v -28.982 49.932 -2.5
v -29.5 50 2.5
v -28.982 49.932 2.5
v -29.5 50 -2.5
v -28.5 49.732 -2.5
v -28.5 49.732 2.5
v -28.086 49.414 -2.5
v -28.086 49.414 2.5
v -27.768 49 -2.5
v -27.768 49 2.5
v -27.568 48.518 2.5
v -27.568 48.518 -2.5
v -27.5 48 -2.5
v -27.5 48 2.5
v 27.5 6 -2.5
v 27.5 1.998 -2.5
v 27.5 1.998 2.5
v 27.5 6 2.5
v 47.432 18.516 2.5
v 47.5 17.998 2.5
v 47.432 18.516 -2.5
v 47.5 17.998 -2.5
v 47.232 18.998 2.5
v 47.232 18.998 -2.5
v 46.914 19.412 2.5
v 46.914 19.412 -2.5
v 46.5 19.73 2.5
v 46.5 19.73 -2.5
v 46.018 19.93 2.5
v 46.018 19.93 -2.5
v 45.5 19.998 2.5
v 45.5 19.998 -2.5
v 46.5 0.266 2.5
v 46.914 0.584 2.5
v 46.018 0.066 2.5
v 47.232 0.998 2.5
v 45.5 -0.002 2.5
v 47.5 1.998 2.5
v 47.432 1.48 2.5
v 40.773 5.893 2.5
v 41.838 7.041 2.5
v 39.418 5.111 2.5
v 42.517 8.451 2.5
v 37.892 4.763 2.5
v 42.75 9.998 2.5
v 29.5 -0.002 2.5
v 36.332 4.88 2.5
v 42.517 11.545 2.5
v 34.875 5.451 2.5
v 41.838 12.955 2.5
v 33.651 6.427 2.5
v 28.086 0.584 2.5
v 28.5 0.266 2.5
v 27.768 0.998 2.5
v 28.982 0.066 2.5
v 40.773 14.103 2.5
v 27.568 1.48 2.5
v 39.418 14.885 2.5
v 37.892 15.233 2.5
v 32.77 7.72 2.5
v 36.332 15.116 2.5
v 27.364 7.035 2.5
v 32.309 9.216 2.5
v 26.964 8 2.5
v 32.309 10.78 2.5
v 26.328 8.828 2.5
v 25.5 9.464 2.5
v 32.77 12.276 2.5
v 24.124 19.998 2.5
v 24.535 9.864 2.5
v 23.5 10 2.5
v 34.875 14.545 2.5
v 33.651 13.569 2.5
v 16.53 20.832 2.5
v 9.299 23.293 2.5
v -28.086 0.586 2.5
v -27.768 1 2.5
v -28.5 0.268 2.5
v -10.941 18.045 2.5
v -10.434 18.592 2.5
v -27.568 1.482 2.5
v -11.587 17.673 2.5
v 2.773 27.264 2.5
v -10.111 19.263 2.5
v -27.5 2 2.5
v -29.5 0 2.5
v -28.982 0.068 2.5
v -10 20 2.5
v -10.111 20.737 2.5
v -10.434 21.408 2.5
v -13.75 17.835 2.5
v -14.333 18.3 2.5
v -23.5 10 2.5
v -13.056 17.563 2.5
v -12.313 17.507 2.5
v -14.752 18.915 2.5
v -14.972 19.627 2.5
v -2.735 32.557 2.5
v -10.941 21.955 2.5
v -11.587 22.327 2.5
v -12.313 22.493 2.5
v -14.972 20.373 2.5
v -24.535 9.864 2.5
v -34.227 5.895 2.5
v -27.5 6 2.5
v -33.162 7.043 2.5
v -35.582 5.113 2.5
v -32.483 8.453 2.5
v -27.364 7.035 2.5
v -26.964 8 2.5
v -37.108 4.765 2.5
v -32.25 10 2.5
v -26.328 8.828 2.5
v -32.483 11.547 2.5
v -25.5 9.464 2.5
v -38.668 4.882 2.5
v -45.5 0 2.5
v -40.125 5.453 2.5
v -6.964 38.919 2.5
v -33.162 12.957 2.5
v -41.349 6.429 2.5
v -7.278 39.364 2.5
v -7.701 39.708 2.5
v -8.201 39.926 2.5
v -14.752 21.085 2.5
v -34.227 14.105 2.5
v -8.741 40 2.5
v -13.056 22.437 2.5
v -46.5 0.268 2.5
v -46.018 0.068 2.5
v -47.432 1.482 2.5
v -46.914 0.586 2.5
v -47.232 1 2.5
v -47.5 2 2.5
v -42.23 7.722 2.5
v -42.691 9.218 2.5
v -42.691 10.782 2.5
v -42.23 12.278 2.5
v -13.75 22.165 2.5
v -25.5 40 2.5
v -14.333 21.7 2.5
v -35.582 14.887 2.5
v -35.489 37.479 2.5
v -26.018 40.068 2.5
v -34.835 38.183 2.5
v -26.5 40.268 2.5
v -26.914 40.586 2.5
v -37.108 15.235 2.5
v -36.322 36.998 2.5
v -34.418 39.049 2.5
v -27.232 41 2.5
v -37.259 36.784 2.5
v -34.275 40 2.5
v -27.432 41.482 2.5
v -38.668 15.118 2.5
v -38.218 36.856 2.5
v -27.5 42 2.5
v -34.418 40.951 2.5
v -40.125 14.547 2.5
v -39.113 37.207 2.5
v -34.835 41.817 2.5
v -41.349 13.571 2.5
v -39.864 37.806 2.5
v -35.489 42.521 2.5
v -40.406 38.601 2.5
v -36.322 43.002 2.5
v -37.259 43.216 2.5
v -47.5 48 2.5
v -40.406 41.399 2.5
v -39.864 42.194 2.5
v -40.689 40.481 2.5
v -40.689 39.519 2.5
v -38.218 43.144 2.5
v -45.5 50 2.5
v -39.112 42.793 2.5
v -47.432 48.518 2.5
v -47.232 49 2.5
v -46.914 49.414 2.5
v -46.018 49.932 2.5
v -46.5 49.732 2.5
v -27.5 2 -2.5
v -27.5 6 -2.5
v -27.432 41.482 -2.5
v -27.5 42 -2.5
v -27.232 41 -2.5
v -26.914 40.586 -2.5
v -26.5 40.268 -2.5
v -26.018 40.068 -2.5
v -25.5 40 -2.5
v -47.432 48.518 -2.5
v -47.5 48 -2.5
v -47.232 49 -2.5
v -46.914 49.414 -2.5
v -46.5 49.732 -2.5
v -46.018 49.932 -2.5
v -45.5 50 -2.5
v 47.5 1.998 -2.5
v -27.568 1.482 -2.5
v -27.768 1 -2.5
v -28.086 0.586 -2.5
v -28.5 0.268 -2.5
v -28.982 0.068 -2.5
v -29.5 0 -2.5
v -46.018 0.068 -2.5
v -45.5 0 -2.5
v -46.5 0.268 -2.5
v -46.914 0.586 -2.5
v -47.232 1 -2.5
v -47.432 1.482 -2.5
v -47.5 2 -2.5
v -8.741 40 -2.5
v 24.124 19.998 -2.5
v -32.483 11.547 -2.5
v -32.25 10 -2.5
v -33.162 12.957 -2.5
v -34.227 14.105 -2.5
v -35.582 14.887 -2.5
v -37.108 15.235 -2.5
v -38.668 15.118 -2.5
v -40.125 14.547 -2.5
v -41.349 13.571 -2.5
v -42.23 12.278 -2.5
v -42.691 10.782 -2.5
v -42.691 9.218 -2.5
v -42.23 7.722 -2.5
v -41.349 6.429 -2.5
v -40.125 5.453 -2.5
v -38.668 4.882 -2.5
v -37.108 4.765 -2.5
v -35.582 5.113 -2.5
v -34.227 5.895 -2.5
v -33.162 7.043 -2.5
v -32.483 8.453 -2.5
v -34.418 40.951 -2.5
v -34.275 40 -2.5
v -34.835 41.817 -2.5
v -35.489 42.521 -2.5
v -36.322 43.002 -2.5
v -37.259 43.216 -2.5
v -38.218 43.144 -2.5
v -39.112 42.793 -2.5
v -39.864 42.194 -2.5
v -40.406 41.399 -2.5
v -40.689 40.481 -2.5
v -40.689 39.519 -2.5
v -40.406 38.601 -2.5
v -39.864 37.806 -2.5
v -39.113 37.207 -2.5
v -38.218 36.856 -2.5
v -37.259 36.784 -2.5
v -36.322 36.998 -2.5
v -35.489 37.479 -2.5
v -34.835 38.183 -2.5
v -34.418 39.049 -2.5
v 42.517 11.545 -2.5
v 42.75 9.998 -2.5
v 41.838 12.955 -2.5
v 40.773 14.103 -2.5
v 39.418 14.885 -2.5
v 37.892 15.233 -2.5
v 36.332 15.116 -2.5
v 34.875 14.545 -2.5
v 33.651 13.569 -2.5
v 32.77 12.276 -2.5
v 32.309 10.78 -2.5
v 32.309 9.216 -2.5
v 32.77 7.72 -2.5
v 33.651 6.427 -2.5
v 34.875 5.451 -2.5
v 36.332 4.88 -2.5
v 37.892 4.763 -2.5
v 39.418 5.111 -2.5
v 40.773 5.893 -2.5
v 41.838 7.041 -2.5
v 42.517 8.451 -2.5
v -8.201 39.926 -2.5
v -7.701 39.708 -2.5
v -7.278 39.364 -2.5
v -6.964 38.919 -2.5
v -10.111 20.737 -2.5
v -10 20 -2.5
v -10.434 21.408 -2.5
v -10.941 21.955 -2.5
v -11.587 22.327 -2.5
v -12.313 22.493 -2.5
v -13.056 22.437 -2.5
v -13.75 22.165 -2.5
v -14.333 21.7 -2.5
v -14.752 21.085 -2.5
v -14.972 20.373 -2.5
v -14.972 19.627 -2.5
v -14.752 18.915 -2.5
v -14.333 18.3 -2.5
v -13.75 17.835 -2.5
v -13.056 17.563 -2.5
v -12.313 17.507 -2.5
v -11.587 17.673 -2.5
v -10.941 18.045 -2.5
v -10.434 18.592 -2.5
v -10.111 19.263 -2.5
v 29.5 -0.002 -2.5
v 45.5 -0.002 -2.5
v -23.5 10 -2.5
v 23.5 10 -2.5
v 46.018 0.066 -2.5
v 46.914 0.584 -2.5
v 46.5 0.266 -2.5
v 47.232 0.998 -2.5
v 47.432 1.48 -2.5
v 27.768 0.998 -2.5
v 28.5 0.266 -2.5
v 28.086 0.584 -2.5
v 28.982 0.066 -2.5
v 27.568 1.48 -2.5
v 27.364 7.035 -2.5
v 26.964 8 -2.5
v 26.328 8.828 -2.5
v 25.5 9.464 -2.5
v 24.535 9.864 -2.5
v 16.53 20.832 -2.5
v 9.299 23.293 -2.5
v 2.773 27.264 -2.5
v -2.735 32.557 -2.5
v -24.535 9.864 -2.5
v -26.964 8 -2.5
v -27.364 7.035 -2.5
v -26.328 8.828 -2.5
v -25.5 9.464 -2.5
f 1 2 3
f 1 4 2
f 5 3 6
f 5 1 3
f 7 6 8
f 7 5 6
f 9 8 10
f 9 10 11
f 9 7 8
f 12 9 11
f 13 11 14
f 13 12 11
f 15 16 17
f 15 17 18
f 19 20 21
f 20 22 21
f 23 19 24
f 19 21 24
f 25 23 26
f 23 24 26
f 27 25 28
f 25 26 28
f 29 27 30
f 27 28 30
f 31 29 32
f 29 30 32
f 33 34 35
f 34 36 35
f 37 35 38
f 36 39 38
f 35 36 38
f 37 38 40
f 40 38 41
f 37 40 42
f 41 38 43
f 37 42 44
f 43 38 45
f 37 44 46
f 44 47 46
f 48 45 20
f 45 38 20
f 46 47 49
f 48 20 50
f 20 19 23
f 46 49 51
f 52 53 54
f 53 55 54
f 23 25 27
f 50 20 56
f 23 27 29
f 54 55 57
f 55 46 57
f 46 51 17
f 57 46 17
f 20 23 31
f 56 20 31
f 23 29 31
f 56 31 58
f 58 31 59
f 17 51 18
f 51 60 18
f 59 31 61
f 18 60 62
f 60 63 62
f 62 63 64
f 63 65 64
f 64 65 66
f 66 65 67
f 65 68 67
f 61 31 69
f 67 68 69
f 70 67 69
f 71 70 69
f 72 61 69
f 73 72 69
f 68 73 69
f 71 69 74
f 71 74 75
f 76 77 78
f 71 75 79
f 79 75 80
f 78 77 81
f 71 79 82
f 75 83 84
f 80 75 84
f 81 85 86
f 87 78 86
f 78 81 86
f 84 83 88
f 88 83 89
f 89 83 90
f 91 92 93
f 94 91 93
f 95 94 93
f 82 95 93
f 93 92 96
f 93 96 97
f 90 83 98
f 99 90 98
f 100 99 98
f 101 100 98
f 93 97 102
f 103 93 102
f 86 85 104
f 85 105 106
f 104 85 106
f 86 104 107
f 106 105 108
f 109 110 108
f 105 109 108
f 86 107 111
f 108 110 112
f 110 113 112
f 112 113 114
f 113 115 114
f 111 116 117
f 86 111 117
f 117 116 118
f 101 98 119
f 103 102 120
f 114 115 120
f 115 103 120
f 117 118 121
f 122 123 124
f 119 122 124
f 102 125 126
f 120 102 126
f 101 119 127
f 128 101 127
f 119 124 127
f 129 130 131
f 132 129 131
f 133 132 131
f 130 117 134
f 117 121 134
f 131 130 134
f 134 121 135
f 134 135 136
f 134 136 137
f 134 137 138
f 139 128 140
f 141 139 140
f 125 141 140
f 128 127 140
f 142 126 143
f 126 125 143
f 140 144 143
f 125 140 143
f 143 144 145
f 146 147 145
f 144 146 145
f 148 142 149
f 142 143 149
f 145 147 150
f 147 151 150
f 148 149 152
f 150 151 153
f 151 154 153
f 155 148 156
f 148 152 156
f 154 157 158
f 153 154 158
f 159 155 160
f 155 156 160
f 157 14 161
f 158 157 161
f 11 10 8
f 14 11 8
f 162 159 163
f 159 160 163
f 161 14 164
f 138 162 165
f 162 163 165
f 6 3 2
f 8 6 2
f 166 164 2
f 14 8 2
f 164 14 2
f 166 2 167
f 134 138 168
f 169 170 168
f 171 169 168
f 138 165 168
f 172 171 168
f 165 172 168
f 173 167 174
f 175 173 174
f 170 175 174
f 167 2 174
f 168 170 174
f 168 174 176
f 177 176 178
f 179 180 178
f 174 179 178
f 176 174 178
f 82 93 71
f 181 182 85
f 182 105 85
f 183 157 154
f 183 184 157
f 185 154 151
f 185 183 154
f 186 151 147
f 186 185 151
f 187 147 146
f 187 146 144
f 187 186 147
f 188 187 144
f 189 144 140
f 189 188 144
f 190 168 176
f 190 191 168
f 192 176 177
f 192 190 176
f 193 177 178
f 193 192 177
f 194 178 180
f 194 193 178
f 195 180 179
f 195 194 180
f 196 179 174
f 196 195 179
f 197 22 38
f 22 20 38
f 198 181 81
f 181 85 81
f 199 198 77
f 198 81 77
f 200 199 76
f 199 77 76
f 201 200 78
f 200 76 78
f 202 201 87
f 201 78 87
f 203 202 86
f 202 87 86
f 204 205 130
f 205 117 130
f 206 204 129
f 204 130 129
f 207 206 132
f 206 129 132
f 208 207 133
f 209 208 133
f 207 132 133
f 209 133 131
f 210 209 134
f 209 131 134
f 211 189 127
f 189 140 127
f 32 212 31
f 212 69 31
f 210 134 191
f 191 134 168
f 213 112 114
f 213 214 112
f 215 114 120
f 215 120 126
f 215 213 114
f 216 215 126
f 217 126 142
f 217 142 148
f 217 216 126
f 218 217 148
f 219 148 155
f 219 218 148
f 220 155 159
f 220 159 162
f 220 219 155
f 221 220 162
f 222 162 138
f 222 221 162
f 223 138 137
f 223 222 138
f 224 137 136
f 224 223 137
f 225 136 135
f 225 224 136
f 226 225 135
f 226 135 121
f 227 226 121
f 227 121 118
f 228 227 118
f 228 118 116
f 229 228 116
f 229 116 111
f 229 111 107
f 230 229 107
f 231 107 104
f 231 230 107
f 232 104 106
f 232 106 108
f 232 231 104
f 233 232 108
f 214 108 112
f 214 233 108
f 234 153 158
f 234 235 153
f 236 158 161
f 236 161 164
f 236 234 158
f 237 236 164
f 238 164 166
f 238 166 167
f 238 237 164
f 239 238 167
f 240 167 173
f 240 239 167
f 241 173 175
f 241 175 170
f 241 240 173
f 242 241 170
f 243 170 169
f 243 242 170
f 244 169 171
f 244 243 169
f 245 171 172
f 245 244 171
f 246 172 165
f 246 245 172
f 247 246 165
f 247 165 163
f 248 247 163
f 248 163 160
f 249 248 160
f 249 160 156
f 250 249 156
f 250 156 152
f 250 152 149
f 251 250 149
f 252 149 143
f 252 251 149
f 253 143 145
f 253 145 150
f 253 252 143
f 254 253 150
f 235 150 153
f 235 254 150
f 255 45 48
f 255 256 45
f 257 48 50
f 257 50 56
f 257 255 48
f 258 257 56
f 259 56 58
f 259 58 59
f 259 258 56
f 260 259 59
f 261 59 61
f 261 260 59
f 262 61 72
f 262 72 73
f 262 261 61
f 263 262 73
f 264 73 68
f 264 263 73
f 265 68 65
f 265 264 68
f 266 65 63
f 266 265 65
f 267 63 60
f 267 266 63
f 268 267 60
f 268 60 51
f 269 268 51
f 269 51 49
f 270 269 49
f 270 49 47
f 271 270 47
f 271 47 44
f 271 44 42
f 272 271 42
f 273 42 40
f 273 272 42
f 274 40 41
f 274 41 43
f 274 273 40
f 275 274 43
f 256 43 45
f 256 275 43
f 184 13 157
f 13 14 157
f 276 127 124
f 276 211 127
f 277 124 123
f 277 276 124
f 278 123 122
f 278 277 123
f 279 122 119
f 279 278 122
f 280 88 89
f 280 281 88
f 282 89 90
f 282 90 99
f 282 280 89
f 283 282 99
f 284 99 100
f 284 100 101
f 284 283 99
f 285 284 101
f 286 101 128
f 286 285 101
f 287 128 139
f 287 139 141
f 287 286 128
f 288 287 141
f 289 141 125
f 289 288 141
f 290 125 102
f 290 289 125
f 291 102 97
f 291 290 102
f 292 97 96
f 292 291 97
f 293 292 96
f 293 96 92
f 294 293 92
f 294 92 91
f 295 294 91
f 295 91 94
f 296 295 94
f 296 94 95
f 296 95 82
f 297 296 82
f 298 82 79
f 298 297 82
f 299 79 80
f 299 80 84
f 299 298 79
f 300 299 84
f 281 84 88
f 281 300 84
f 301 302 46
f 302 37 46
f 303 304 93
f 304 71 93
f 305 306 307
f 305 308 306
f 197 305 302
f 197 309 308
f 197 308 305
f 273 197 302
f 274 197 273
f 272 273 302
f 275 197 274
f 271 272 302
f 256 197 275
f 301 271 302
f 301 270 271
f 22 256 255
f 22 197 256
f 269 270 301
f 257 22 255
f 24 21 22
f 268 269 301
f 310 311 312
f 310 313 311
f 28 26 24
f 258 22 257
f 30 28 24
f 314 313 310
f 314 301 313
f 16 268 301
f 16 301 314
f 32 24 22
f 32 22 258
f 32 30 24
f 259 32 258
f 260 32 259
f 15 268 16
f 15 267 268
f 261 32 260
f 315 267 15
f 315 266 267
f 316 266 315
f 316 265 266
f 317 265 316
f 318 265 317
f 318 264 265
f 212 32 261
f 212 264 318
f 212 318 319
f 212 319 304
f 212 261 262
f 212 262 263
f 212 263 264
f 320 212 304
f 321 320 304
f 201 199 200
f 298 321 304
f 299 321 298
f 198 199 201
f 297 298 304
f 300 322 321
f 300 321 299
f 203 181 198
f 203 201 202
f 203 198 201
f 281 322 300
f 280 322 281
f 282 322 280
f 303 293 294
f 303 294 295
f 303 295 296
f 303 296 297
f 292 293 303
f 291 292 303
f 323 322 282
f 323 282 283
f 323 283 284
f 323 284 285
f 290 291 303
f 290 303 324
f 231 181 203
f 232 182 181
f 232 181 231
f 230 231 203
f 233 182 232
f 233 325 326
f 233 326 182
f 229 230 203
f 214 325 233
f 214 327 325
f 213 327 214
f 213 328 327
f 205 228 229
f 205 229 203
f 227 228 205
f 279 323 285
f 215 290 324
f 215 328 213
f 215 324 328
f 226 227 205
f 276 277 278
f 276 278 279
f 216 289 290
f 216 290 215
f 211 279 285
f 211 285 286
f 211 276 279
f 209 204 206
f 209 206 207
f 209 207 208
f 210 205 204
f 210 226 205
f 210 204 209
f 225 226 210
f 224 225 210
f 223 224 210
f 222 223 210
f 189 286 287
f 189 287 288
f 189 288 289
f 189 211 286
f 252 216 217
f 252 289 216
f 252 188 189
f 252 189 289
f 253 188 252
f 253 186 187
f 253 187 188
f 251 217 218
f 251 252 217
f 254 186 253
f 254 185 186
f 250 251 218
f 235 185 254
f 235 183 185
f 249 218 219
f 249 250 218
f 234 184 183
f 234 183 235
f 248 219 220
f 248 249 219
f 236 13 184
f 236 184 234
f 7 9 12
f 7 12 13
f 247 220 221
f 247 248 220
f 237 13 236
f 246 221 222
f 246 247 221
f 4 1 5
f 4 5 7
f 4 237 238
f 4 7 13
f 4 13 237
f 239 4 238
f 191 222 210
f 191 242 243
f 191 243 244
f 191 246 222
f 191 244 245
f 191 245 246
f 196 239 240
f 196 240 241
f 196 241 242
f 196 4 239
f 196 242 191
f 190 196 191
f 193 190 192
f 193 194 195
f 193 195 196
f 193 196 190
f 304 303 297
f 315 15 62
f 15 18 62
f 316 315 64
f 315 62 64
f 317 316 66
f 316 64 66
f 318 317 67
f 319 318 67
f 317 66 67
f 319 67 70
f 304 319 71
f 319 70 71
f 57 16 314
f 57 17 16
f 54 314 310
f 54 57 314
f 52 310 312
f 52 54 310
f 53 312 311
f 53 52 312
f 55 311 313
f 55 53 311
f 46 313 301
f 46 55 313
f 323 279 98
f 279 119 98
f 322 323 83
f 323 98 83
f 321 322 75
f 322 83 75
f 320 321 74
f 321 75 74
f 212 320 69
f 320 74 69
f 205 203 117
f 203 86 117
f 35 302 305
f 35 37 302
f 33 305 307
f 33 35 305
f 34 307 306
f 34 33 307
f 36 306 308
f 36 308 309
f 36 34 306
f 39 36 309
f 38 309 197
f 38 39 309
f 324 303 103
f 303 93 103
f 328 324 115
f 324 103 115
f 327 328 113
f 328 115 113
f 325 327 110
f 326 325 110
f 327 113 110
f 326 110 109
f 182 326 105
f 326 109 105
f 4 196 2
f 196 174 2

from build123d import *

# Parameters (mm, degrees)
SKETCH1_R           = 5.25
SKETCH1_R_2         = 3.225
SKETCH1_R_3         = 2.5
BOSS_EXTRUDE1_DEPTH = 2.5
FILLET1_R           = 4
FILLET3_R           = 2


with BuildPart() as part:
    # Sketch1 → Boss-Extrude1 (new, symmetric)
    with BuildSketch(Plane.XY):
        with BuildLine():
            Line((-47.5, 0), (-47.5, 50))
            Line((-47.5, 50), (-27.5, 50))
            Line((-27.5, 50), (-27.5, 40))
            Line((-27.5, 40), (-7.5, 40))
            ThreePointArc((-7.5, 40), (5.414502852, 25.418195989), (24.123722991, 19.998004673))
            Line((24.123722991, 19.998004673), (47.5, 19.998004673))
            Line((47.5, 19.998004673), (47.5, -0.001995327))
            Line((47.5, -0.001995327), (27.5, -0.001995327))
            Line((27.5, -0.001995327), (27.5, 10))
            Line((27.5, 10), (-27.5, 10))
            Line((-27.5, 10), (-27.5, 0))
            Line((-27.5, 0), (-47.5, 0))
        make_face()
        with Locations((-37.5, 10)):
            Circle(SKETCH1_R, mode=Mode.SUBTRACT)
        with Locations((-37.5, 40)):
            Circle(SKETCH1_R_2, mode=Mode.SUBTRACT)
        with Locations((-12.5, 20)):
            Circle(SKETCH1_R_3, mode=Mode.SUBTRACT)
        with Locations((37.5, 9.998004673)):
            Circle(SKETCH1_R, mode=Mode.SUBTRACT)
    extrude(amount=BOSS_EXTRUDE1_DEPTH, both=True)

    # Fillet1
    fillet1_edges = [part.edges().sort_by_distance(p)[0] for p in [
        (27.5, 10, 0),
        (-27.5, 10, 0),
    ]]
    fillet(fillet1_edges, radius=FILLET1_R)

    # Fillet3
    fillet3_edges = [part.edges().sort_by_distance(p)[0] for p in [
        (-47.5, 0, 0),
        (-47.5, 50, 0),
        (-27.5, 50, 0),
        (-27.5, 40, 0),
        (-7.5, 40, 0),
        (47.5, 19.998004673, 0),
        (47.5, -0.001995327, 0),
        (27.5, -0.001995327, 0),
        (-27.5, 0, 0),
    ]]
    fillet(fillet3_edges, radius=FILLET3_R)


solid = part.part
